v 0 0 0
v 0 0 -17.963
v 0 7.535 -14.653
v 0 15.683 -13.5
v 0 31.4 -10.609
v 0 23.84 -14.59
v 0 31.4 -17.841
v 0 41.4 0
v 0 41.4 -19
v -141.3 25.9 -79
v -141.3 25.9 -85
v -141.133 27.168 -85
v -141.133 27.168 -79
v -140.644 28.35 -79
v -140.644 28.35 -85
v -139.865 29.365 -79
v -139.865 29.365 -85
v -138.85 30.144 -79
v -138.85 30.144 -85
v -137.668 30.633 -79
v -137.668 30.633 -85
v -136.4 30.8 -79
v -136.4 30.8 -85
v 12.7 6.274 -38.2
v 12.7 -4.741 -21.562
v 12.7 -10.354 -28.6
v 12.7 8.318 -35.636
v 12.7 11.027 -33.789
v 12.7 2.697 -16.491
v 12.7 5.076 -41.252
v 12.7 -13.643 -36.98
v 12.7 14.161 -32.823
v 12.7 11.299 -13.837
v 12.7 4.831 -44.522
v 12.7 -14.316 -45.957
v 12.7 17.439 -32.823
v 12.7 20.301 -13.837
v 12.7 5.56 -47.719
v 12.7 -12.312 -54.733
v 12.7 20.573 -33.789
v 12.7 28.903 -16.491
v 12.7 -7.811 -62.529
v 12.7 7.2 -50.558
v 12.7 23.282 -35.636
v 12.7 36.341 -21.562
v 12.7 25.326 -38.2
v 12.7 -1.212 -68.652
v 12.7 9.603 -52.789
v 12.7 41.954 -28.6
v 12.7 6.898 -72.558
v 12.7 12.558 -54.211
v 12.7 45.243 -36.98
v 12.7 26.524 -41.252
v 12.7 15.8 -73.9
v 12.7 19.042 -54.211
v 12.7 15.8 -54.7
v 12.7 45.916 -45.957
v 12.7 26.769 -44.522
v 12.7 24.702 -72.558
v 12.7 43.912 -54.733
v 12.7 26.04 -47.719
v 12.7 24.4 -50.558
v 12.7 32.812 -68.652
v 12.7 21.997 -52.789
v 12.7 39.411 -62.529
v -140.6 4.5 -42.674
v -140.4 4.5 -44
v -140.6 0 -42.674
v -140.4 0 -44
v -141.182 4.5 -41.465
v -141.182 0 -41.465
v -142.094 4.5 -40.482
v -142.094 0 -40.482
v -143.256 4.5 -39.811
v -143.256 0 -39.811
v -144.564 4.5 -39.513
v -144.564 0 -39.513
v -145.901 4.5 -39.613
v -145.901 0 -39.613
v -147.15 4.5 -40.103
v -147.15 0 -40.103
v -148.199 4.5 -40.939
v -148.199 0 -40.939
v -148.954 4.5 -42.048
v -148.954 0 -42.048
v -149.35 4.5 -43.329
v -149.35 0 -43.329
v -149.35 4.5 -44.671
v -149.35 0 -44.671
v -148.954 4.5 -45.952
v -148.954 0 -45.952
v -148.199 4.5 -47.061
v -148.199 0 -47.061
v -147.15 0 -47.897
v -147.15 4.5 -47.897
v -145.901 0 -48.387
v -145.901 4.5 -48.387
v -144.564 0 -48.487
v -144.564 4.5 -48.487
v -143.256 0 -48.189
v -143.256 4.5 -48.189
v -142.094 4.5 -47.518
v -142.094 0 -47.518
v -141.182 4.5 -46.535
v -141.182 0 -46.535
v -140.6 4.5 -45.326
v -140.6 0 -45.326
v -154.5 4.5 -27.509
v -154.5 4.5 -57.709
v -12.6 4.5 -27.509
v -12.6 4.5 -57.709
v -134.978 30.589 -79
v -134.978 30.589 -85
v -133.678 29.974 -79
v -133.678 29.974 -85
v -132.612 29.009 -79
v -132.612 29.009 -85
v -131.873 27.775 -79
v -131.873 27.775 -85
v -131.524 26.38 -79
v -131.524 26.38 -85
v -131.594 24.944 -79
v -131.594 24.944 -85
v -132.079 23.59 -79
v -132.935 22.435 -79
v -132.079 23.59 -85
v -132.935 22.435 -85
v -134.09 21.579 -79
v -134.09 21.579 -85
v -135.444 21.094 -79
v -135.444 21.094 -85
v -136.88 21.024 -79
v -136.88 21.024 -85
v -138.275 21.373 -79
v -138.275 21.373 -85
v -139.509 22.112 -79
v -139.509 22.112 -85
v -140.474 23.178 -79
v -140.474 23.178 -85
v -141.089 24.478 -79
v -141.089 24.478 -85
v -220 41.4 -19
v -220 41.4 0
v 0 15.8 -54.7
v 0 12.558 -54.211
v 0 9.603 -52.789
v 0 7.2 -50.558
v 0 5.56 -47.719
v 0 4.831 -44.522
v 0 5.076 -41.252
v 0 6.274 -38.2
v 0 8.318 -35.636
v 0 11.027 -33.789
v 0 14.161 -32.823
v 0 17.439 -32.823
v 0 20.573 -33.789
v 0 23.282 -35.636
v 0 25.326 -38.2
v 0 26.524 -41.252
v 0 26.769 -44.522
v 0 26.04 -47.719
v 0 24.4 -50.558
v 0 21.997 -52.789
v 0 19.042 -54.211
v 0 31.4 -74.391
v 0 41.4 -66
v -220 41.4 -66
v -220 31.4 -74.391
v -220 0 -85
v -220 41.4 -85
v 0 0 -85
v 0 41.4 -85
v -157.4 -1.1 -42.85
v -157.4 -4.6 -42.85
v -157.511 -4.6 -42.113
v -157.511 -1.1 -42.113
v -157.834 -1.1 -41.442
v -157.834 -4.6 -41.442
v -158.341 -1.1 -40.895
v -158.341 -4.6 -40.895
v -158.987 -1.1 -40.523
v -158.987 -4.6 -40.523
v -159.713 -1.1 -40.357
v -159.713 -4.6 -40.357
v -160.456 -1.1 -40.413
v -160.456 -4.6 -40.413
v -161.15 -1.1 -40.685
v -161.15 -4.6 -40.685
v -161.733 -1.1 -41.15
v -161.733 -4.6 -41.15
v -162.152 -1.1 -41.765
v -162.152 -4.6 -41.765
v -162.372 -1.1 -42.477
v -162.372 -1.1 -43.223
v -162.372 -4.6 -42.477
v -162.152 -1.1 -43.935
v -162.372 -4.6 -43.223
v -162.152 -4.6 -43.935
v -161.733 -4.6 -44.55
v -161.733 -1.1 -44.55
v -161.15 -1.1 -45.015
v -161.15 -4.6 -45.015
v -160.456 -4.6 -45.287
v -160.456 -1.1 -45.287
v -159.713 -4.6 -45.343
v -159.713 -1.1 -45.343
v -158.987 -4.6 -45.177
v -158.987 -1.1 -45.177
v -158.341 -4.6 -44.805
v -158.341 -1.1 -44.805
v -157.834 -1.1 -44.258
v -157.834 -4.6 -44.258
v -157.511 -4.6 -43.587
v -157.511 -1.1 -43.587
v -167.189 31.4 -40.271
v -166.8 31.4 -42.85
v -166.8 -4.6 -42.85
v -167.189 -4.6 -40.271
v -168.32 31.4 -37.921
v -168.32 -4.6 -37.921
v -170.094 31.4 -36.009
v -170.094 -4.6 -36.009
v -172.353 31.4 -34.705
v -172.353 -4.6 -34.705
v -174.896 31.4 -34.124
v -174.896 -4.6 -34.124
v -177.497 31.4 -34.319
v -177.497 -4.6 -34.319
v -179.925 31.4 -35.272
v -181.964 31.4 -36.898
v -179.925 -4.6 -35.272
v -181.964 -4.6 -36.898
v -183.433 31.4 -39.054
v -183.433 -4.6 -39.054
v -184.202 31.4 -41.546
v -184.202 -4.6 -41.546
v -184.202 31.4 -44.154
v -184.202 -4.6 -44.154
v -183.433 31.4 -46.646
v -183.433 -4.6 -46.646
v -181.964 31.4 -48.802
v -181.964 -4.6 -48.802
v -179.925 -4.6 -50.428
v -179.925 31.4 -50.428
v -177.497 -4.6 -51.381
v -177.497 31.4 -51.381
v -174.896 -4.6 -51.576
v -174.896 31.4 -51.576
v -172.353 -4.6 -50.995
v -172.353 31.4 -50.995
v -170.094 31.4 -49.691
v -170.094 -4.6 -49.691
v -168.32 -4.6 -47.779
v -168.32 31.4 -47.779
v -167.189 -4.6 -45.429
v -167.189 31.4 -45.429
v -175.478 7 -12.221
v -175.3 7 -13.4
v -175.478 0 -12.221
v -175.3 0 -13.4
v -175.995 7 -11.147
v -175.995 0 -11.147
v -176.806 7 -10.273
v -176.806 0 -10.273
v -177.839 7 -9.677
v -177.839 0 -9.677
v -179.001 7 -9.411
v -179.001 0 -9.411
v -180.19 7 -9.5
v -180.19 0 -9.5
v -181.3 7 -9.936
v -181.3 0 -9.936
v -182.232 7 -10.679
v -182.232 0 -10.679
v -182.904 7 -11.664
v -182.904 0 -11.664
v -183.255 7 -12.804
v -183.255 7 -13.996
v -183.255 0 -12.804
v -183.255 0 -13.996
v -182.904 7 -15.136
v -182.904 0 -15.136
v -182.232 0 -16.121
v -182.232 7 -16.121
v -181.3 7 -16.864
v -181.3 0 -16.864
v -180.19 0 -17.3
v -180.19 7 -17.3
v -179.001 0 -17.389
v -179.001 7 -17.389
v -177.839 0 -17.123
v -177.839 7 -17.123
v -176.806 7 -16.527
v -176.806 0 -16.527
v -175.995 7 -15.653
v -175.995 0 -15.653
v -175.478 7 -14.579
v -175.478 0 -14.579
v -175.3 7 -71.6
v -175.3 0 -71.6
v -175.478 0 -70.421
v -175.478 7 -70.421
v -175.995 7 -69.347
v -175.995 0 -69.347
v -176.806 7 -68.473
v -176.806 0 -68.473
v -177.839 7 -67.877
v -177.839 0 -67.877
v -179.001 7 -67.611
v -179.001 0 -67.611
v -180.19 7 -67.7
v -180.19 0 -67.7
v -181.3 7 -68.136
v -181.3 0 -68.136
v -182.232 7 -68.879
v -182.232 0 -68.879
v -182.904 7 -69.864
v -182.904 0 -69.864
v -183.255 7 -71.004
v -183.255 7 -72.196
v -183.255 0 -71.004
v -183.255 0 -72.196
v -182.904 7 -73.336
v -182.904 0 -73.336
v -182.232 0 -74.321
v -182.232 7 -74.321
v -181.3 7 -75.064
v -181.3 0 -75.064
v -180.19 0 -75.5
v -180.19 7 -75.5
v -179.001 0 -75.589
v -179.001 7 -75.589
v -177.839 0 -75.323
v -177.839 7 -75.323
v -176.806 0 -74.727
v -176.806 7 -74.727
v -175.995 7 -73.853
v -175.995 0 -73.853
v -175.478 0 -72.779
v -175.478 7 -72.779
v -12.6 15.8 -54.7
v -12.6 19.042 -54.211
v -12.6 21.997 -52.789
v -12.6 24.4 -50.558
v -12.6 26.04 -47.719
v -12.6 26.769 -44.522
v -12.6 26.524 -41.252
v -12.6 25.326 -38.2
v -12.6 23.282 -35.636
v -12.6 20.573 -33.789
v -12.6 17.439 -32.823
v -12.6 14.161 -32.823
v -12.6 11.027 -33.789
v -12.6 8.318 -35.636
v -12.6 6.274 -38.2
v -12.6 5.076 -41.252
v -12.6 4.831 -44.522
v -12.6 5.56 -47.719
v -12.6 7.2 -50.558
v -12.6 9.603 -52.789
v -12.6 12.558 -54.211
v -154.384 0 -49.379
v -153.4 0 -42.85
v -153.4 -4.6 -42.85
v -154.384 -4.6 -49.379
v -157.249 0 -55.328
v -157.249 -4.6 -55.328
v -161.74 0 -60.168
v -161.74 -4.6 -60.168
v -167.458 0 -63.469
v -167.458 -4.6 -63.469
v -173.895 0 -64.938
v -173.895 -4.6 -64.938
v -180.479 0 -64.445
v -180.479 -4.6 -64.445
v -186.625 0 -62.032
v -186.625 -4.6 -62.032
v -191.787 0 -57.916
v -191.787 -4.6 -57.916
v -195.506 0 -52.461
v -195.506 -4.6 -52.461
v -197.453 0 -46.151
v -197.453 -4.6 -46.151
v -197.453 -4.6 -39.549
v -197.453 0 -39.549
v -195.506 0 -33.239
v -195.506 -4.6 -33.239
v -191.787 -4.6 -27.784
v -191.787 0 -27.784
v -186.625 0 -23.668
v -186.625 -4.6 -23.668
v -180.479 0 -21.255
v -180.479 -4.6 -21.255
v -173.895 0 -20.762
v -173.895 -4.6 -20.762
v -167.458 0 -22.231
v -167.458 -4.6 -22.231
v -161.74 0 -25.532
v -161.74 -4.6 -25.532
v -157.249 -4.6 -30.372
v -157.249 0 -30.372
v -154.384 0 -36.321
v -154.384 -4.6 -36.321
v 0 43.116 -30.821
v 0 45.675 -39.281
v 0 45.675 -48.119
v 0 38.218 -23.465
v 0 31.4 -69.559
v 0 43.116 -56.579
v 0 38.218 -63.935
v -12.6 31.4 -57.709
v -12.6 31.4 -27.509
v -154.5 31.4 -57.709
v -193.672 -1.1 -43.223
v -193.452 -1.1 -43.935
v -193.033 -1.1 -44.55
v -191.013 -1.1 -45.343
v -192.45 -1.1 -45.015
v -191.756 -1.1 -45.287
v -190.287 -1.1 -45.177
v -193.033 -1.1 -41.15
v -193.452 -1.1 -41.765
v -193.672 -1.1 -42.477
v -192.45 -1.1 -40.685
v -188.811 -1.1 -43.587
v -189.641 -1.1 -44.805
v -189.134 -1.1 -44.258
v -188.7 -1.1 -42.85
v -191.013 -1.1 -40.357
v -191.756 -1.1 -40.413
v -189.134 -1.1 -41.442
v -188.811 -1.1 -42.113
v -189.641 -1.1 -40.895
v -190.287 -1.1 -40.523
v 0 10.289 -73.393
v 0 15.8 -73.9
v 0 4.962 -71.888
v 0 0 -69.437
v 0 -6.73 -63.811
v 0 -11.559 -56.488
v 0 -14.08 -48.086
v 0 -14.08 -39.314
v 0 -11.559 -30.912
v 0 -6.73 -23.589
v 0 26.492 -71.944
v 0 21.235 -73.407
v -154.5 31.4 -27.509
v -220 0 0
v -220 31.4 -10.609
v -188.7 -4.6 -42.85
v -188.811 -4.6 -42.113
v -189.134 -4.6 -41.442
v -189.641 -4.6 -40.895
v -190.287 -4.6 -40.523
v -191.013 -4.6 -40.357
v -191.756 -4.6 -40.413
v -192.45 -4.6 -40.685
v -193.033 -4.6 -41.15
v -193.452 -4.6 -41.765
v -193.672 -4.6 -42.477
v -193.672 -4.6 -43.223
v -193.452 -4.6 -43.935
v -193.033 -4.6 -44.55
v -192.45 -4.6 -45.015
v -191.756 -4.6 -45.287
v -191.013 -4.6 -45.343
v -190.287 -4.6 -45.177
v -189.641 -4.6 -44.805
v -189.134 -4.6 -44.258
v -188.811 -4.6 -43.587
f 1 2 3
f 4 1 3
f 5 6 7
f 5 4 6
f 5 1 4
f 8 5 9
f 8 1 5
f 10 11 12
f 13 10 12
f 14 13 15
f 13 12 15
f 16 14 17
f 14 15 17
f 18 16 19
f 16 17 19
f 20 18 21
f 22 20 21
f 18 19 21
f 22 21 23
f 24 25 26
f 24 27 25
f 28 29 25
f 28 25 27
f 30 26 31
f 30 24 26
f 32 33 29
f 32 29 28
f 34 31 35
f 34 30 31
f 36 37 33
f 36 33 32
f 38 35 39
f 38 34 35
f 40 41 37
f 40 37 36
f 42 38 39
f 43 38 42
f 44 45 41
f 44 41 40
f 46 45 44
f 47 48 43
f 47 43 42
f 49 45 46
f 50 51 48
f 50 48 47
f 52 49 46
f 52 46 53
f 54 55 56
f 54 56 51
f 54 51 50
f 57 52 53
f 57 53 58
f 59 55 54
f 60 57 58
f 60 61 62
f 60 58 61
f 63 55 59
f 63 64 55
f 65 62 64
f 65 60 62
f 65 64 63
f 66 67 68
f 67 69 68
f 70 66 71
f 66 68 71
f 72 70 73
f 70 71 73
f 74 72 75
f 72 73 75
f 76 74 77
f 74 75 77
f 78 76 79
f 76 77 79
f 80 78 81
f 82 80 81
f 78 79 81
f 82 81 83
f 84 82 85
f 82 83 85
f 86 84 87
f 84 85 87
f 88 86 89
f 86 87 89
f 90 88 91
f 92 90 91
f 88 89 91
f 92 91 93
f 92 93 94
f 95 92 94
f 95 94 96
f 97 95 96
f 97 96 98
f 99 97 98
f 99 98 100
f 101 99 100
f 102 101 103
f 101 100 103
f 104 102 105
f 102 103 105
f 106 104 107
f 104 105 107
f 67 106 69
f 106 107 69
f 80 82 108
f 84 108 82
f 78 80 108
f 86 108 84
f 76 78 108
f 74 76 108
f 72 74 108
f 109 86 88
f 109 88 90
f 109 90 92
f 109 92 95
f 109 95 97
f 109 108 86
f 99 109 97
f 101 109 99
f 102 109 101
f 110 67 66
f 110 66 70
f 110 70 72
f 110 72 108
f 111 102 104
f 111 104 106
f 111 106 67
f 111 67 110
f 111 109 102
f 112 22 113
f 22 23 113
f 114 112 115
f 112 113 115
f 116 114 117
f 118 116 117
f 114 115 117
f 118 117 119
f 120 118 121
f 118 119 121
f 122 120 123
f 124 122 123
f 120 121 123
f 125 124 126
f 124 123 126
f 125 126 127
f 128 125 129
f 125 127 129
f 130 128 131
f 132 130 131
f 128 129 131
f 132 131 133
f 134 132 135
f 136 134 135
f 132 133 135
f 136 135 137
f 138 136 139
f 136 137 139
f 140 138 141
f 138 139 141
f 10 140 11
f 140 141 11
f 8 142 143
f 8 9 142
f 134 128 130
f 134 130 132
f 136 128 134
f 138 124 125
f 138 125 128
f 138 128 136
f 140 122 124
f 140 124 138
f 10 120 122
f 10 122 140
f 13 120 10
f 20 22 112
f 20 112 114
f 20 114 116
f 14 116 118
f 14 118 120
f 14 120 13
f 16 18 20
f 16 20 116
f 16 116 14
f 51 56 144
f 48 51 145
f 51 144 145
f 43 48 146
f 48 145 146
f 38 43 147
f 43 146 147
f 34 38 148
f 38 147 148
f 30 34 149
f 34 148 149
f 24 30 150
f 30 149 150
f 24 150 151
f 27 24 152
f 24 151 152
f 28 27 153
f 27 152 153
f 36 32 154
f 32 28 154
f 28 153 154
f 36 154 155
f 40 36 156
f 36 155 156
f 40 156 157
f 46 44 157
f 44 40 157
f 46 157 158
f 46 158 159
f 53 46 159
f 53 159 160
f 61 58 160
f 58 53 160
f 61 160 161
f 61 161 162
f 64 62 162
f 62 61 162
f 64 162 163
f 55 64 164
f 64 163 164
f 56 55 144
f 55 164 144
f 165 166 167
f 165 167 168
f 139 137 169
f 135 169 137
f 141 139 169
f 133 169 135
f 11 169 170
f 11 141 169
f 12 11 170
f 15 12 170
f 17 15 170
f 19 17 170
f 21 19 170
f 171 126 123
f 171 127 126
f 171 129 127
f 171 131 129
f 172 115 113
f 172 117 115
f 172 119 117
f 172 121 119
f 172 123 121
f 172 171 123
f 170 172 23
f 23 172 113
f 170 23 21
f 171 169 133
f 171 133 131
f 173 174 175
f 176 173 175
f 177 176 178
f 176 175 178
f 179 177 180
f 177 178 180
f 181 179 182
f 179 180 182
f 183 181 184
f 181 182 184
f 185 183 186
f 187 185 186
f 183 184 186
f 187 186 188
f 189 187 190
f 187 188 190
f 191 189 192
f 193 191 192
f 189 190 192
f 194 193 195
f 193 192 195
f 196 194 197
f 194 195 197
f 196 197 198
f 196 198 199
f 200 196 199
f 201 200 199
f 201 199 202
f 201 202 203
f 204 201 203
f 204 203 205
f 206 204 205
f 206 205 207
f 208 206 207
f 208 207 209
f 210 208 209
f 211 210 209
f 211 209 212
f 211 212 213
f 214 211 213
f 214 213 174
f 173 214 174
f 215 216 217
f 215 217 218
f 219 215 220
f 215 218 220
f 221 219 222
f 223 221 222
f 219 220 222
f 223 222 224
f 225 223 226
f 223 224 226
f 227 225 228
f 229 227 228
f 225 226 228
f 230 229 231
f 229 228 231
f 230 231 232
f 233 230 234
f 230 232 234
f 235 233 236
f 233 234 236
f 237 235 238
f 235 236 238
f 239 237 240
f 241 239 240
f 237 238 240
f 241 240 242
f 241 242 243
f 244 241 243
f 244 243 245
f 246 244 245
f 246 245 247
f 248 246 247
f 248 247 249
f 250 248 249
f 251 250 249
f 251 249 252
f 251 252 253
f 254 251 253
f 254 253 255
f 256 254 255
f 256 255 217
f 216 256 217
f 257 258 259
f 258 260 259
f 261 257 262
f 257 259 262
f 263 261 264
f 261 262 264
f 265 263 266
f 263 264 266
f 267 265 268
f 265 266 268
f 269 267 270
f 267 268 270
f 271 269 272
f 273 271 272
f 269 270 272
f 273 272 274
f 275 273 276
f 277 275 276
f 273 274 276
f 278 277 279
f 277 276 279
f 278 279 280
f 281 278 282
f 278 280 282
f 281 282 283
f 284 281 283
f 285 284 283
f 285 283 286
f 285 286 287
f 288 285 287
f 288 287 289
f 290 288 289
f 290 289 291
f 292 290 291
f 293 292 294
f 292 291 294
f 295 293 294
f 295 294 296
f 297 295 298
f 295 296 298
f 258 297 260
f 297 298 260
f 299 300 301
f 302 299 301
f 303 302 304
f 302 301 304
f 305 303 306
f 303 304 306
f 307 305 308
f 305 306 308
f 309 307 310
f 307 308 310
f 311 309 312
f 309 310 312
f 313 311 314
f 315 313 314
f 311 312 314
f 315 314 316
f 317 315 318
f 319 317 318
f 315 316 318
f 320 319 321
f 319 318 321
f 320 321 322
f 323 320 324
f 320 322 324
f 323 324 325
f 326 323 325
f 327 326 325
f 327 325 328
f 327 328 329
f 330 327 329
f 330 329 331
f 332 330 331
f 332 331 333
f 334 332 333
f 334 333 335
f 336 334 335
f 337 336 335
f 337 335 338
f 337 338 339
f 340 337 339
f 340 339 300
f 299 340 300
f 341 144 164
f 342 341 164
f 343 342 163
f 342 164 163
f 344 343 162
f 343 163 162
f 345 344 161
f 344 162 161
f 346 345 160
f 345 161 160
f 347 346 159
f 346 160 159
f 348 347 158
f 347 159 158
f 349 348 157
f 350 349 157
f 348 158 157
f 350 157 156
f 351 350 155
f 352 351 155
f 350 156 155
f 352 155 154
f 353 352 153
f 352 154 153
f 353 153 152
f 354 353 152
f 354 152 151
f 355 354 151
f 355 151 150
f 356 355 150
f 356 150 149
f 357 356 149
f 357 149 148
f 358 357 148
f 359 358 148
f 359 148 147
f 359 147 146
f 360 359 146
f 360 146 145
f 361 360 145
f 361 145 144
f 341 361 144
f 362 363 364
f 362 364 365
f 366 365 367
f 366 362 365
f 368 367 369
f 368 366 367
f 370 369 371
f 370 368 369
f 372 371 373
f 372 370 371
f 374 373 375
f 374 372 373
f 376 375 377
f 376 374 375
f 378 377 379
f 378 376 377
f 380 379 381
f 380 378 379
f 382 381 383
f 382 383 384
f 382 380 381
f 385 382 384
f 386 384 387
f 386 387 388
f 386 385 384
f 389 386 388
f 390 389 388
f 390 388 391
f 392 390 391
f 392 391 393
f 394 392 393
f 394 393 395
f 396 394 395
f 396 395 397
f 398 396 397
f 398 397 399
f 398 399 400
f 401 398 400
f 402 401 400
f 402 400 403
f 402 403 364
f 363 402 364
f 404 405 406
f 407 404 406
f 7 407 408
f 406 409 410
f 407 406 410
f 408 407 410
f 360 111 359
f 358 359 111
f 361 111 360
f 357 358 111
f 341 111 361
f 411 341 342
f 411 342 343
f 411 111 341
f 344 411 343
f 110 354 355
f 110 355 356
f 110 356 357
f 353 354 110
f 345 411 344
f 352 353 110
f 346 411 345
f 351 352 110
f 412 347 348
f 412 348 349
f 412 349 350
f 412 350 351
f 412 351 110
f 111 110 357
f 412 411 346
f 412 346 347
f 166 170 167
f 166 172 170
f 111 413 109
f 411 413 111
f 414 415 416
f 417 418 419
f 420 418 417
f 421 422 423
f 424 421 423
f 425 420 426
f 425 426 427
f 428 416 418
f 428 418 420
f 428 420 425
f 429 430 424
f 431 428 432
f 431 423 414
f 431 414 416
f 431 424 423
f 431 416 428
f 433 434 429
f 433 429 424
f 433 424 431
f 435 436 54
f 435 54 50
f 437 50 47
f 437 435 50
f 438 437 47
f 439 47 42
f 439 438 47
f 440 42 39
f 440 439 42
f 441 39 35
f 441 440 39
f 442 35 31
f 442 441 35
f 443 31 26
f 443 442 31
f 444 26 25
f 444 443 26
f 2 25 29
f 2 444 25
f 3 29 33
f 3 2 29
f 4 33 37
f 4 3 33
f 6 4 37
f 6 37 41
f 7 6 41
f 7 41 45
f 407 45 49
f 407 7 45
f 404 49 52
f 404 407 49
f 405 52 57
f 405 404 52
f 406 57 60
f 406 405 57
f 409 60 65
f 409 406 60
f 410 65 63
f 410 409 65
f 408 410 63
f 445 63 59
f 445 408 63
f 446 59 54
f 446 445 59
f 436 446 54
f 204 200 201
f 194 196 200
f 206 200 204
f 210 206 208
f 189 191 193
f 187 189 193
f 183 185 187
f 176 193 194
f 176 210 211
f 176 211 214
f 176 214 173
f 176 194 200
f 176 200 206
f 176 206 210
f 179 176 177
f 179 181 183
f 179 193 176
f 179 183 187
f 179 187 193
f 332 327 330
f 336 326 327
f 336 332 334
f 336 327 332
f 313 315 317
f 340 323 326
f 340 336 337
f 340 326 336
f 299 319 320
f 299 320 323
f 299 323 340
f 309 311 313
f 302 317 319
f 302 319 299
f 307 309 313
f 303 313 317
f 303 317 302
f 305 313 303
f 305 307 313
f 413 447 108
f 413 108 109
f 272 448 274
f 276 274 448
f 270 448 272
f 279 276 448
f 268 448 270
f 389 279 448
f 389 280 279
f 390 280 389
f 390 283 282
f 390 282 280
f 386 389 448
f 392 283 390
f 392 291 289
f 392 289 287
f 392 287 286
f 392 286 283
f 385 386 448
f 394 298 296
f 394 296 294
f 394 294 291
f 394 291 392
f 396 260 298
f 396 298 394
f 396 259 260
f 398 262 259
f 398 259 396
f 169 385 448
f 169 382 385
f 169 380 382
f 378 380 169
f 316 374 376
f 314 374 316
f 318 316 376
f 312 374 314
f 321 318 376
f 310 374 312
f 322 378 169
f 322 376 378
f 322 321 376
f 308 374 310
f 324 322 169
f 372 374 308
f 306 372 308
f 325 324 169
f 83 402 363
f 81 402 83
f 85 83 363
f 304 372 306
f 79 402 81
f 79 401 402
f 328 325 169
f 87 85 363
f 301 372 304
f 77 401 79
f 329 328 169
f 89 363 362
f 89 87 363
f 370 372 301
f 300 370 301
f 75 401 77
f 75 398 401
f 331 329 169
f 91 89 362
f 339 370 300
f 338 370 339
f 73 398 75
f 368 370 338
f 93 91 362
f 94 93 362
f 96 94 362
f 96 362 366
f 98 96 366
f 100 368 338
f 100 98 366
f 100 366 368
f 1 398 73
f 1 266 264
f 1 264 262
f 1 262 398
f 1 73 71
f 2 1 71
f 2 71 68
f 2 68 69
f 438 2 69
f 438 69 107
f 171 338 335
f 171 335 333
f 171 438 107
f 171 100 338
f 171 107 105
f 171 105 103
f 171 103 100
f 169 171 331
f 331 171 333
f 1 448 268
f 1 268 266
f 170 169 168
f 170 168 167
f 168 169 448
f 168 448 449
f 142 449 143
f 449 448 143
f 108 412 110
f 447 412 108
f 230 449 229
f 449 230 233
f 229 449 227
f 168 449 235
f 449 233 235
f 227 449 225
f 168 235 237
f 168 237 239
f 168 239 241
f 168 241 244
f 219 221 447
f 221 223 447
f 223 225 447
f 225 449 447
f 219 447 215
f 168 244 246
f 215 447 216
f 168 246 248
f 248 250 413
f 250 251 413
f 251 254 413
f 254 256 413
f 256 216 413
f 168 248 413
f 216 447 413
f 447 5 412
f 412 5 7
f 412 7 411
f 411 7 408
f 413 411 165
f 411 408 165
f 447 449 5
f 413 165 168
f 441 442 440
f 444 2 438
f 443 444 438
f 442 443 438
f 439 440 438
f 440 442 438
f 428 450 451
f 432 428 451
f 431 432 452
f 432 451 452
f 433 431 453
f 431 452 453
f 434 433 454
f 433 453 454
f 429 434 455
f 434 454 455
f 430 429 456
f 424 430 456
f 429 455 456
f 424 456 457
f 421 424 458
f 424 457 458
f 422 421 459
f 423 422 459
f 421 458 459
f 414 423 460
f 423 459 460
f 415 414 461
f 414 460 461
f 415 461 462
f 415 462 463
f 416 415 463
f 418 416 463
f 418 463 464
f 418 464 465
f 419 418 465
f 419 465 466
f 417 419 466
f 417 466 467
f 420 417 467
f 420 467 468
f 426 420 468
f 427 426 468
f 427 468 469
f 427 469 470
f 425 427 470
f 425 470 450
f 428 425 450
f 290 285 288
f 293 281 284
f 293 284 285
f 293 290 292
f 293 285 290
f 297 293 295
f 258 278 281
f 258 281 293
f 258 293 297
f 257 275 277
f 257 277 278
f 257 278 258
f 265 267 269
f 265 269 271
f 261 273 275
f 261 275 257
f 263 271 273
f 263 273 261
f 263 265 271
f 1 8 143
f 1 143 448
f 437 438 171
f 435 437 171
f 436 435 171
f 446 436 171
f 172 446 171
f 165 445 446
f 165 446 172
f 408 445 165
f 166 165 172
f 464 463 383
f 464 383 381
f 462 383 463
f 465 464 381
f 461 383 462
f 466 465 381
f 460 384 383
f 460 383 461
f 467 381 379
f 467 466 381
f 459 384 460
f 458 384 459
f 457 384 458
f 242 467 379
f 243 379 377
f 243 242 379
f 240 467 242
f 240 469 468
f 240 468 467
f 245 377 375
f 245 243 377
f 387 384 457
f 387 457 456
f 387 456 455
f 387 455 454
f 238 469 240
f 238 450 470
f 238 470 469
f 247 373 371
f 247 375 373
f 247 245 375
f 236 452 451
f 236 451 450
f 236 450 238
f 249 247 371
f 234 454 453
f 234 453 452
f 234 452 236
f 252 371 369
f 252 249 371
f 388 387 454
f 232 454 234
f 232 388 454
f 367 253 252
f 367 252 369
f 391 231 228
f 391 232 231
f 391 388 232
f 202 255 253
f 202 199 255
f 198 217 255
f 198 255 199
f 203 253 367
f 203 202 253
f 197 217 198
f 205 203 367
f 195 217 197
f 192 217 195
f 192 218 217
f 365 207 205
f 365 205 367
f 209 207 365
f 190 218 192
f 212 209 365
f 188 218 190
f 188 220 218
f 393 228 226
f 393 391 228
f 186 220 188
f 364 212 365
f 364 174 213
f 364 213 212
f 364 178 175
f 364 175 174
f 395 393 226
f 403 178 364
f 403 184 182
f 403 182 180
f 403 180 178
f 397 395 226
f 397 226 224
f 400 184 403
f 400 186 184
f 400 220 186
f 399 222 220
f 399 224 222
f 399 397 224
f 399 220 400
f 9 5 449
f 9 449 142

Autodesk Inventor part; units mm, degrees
ref_plane "YZ Plane" through (0, 0, 0) normal (1, 0, 0) x (0, 1, 0)
ref_plane "XZ Plane" through (0, 0, 0) normal (0, 1, 0) x (-1, 0, 0)
ref_plane "XY Plane" through (0, 0, 0) normal (0, 0, 1) x (1, 0, 0)
sketch "Sketch1" plane through (0, 0, 0) normal (1, 0, 0) x (0, 1, 0)
  line L0 (0, 0) -> (0, -85)
  line L1 (0, -85) -> (41.4, -85)
  line L2 (41.4, -85) -> (41.4, 0)
  line L3 (41.4, 0) -> (0, 0)
  dimension "d0" = 85
  dimension "d1" = 41.4
extrude "Extrusion1" add sketch "Sketch1" against normal blind 220
sketch "Sketch2" plane through (0, 0, 0) normal (1, 0, 0) x (0, 0, -1)
  line L0 (0, 41.4) -> (19, 41.4)
  line L1 (10.609, 31.4) -> (19, 41.4)
  line L2 (10.609, 31.4) -> (74.391, 31.4)
  line L3 (85, 41.4) -> (66, 41.4)
  line L4 (66, 41.4) -> (74.391, 31.4)
  line L5 (19, 41.4) -> (66, 41.4)
  line L6 (0, 41.4) -> (85, 41.4) projected
  line L7 (42.5, 41.4) -> (42.5, 31.4) construction
  dimension "d4" = 19
  dimension "d8" = 19
  dimension "d61" = 50
  dimension "d63" = 50
  dimension "d64" = 10
extrude "Extrusion2" cut sketch "Sketch2" against normal blind 301.25
sketch "Sketch3" plane through (0, 31.4, -10.609) normal (0, 1, 0) x (1, 0, 0)
  line L0 (0, -10.609) -> (0, 74.391) projected
  line L1 (-12.6, 32) -> (-12.6, 47.1)
  line L2 (-12.6, 32) -> (-12.6, 16.9)
  line L3 (-12.6, 16.9) -> (-154.5, 16.9)
  line L4 (-154.5, 16.9) -> (-154.5, 47.1)
  line L5 (-154.5, 47.1) -> (-12.6, 47.1)
  dimension "d12" = 15.1
  dimension "d13" = 15.1
  dimension "d14" = 141.9
extrude "Extrusion3" cut sketch "Sketch3" against normal blind 26.9
sketch "Sketch4" plane through (0, 31.4, -10.609) normal (0, 1, 0) x (1, 0, 0)
  point P0 (0, -10.609)
sketch "Sketch5" plane through (0, 0, 0) normal (1, 0, 0) x (0, 0, -1)
  line L0 (0, 41.4) -> (0, 0) projected
  line L1 (0, 0) -> (28.6, 0)
  line L2 (85, 0) -> (0, 0) projected
  line L3 (28.6, 0) -> (58.8, 0)
  line L4 (85, 41.4) -> (85, 0) projected
  line L5 (58.8, 0) -> (85, 0)
  line L6 (28.6, 0) -> (43.7, 0)
  line L7 (43.7, 0) -> (43.7, 31.4)
  line L8 (27.509, 31.4) -> (57.709, 31.4) projected
  line L9 (43.7, 31.4) -> (43.7, 26.8)
  line L10 (43.7, 26.8) -> (43.7, 14.6)
  line L11 (43.7, 26.8) -> (43.7, 15.8)
  circle A0 centre (43.7, 15.8) radius 11
  dimension "d17" = 28.6
  dimension "d18" = 30.2
  dimension "d19" = 4.6
  dimension "d21" = 11
extrude "Extrusion4" cut sketch "Sketch5" against normal blind 91.9
sketch "Sketch6" plane through (0, 0, 0) normal (1, 0, 0) x (0, 0, -1)
  point P0 (0, 0)
sketch "Sketch7" plane through (0, 0, 0) normal (1, 0, 0) x (0, 0, -1)
  circle A0 centre (43.7, 15.8) radius 11 projected
  circle A1 centre (43.7, 15.8) radius 30.2
  point P0 (0, 0)
  dimension "d24" = 60.4
extrude "Extrusion5" add sketch "Sketch7" along normal blind 12.7
sketch "Sketch8" plane through (0, 0, -85) normal (0, 0, -1) x (-1, 0, 0)
  line L0 (220, 31.4) -> (220, 41.4) projected
  line L1 (220, 41.4) -> (220, 30.8)
  line L2 (220, 41.4) -> (220, 0) projected
  line L3 (220, 30.8) -> (136.4, 30.8)
  line L4 (154.5, 31.4) -> (12.6, 31.4) projected
  line L5 (136.4, 30.8) -> (136.4, 25.9)
  line L6 (0, 0) -> (220, 0) projected
  circle A0 centre (136.4, 25.9) radius 4.9
  dimension "d27" = 10.6
  dimension "d28" = 83.6
  dimension "d29" = 90
  dimension "d30" = 4.9
extrude "Extrusion6" cut sketch "Sketch8" against normal blind 6
sketch "Sketch9" plane through (-220, 0, 0) normal (0, -1, 0) x (1, 0, 0)
  line L0 (0, -85) -> (0, 0) projected
  line L1 (0, -85) -> (0, -63)
  line L2 (0, -63) -> (22.3, -63)
  line L3 (0, 0) -> (0, -22.7)
  line L4 (0, -22.7) -> (22.3, -22.7)
  line L5 (22.3, -22.7) -> (22.3, -63)
  line L6 (22.3, -42.85) -> (44.45, -42.85)
  line L7 (65.5, -27.509) -> (65.5, -57.709) projected
  line L8 (22.3, -42.85) -> (44.45, -42.85) construction
  circle A0 centre (44.45, -42.85) radius 22.15
  point P0 (220, 0)
  dimension "d33" = 22
  dimension "d34" = 22.3
  dimension "d35" = 22.7
  dimension "d36" = 22.15
  dimension "d37" = 0
extrude "Extrusion7" add sketch "Sketch9" along normal blind 4.6 contours A0 L7 | A0 L7
sketch "Sketch10" plane through (-175.55, -4.6, -42.85) normal (0, -1, 0) x (1, 0, 0)
  circle A0 centre (0, 0) radius 8.75
  point P0 (175.55, 42.85)
  dimension "d40" = 17.5
extrude "Extrusion8" cut sketch "Sketch10" against normal blind 310.85
sketch "Sketch11" plane through (-175.55, -4.6, -42.85) normal (0, -1, 0) x (1, 0, 0)
  circle A0 centre (0, 0) radius 8.75 projected
  line L0 (-8.75, 0) -> (-13.15, 0)
  line L1 (-13.15, 0) -> (-18.15, 0)
  circle A1 centre (-15.65, 0) radius 2.5
  line L2 (8.75, 0) -> (13.15, 0)
  line L3 (13.15, 0) -> (15.65, 0)
  circle A2 centre (15.65, 0) radius 2.5
  point P0 (175.55, 42.85)
  dimension "d43" = 4.4
  dimension "d44" = 5
  dimension "d45" = 4.4
  dimension "d46" = 2.5
extrude "Extrusion9" cut sketch "Sketch11" against normal blind 3.5 contours A1 L1 | L1 A1 | A2
sketch "Sketch12" plane through (-220, 0, 0) normal (0, -1, 0) x (1, 0, 0)
  line L0 (0, 0) -> (40.7, 0)
  line L1 (220, 0) -> (0, 0) projected
  line L2 (40.7, 0) -> (40.7, -9.4)
  line L3 (40.7, -9.4) -> (40.7, -13.4)
  circle A0 centre (40.7, -13.4) radius 4
  line L4 (220, -85) -> (0, -85) projected
  line L5 (0, -85) -> (40.7, -85)
  line L6 (40.7, -85) -> (40.7, -75.6)
  line L7 (40.7, -75.6) -> (40.7, -71.6)
  circle A1 centre (40.7, -71.6) radius 4
  line L8 (0, 0) -> (70.6, 0)
  line L9 (70.6, 0) -> (70.6, -39.5)
  line L10 (70.6, -39.5) -> (70.6, -44)
  line L11 (70.6, -39.5) -> (75.1, -39.5)
  line L12 (75.1, -39.5) -> (75.1, -44)
  circle A2 centre (75.1, -44) radius 4.5
  dimension "d49" = 40.7
  dimension "d50" = 9.4
  dimension "d51" = 4
  dimension "d52" = 40.7
  dimension "d53" = 9.4
  dimension "d54" = 4
  dimension "d55" = 70.6
  dimension "d56" = 39.5
  dimension "d57" = 4.5
  dimension "d58" = 4.5
extrude "Extrusion10" cut sketch "Sketch12" against normal blind 7 contours A0 | A2 | A1
properties part number "Bottom Tool Bit" material "Steel, Cast"
